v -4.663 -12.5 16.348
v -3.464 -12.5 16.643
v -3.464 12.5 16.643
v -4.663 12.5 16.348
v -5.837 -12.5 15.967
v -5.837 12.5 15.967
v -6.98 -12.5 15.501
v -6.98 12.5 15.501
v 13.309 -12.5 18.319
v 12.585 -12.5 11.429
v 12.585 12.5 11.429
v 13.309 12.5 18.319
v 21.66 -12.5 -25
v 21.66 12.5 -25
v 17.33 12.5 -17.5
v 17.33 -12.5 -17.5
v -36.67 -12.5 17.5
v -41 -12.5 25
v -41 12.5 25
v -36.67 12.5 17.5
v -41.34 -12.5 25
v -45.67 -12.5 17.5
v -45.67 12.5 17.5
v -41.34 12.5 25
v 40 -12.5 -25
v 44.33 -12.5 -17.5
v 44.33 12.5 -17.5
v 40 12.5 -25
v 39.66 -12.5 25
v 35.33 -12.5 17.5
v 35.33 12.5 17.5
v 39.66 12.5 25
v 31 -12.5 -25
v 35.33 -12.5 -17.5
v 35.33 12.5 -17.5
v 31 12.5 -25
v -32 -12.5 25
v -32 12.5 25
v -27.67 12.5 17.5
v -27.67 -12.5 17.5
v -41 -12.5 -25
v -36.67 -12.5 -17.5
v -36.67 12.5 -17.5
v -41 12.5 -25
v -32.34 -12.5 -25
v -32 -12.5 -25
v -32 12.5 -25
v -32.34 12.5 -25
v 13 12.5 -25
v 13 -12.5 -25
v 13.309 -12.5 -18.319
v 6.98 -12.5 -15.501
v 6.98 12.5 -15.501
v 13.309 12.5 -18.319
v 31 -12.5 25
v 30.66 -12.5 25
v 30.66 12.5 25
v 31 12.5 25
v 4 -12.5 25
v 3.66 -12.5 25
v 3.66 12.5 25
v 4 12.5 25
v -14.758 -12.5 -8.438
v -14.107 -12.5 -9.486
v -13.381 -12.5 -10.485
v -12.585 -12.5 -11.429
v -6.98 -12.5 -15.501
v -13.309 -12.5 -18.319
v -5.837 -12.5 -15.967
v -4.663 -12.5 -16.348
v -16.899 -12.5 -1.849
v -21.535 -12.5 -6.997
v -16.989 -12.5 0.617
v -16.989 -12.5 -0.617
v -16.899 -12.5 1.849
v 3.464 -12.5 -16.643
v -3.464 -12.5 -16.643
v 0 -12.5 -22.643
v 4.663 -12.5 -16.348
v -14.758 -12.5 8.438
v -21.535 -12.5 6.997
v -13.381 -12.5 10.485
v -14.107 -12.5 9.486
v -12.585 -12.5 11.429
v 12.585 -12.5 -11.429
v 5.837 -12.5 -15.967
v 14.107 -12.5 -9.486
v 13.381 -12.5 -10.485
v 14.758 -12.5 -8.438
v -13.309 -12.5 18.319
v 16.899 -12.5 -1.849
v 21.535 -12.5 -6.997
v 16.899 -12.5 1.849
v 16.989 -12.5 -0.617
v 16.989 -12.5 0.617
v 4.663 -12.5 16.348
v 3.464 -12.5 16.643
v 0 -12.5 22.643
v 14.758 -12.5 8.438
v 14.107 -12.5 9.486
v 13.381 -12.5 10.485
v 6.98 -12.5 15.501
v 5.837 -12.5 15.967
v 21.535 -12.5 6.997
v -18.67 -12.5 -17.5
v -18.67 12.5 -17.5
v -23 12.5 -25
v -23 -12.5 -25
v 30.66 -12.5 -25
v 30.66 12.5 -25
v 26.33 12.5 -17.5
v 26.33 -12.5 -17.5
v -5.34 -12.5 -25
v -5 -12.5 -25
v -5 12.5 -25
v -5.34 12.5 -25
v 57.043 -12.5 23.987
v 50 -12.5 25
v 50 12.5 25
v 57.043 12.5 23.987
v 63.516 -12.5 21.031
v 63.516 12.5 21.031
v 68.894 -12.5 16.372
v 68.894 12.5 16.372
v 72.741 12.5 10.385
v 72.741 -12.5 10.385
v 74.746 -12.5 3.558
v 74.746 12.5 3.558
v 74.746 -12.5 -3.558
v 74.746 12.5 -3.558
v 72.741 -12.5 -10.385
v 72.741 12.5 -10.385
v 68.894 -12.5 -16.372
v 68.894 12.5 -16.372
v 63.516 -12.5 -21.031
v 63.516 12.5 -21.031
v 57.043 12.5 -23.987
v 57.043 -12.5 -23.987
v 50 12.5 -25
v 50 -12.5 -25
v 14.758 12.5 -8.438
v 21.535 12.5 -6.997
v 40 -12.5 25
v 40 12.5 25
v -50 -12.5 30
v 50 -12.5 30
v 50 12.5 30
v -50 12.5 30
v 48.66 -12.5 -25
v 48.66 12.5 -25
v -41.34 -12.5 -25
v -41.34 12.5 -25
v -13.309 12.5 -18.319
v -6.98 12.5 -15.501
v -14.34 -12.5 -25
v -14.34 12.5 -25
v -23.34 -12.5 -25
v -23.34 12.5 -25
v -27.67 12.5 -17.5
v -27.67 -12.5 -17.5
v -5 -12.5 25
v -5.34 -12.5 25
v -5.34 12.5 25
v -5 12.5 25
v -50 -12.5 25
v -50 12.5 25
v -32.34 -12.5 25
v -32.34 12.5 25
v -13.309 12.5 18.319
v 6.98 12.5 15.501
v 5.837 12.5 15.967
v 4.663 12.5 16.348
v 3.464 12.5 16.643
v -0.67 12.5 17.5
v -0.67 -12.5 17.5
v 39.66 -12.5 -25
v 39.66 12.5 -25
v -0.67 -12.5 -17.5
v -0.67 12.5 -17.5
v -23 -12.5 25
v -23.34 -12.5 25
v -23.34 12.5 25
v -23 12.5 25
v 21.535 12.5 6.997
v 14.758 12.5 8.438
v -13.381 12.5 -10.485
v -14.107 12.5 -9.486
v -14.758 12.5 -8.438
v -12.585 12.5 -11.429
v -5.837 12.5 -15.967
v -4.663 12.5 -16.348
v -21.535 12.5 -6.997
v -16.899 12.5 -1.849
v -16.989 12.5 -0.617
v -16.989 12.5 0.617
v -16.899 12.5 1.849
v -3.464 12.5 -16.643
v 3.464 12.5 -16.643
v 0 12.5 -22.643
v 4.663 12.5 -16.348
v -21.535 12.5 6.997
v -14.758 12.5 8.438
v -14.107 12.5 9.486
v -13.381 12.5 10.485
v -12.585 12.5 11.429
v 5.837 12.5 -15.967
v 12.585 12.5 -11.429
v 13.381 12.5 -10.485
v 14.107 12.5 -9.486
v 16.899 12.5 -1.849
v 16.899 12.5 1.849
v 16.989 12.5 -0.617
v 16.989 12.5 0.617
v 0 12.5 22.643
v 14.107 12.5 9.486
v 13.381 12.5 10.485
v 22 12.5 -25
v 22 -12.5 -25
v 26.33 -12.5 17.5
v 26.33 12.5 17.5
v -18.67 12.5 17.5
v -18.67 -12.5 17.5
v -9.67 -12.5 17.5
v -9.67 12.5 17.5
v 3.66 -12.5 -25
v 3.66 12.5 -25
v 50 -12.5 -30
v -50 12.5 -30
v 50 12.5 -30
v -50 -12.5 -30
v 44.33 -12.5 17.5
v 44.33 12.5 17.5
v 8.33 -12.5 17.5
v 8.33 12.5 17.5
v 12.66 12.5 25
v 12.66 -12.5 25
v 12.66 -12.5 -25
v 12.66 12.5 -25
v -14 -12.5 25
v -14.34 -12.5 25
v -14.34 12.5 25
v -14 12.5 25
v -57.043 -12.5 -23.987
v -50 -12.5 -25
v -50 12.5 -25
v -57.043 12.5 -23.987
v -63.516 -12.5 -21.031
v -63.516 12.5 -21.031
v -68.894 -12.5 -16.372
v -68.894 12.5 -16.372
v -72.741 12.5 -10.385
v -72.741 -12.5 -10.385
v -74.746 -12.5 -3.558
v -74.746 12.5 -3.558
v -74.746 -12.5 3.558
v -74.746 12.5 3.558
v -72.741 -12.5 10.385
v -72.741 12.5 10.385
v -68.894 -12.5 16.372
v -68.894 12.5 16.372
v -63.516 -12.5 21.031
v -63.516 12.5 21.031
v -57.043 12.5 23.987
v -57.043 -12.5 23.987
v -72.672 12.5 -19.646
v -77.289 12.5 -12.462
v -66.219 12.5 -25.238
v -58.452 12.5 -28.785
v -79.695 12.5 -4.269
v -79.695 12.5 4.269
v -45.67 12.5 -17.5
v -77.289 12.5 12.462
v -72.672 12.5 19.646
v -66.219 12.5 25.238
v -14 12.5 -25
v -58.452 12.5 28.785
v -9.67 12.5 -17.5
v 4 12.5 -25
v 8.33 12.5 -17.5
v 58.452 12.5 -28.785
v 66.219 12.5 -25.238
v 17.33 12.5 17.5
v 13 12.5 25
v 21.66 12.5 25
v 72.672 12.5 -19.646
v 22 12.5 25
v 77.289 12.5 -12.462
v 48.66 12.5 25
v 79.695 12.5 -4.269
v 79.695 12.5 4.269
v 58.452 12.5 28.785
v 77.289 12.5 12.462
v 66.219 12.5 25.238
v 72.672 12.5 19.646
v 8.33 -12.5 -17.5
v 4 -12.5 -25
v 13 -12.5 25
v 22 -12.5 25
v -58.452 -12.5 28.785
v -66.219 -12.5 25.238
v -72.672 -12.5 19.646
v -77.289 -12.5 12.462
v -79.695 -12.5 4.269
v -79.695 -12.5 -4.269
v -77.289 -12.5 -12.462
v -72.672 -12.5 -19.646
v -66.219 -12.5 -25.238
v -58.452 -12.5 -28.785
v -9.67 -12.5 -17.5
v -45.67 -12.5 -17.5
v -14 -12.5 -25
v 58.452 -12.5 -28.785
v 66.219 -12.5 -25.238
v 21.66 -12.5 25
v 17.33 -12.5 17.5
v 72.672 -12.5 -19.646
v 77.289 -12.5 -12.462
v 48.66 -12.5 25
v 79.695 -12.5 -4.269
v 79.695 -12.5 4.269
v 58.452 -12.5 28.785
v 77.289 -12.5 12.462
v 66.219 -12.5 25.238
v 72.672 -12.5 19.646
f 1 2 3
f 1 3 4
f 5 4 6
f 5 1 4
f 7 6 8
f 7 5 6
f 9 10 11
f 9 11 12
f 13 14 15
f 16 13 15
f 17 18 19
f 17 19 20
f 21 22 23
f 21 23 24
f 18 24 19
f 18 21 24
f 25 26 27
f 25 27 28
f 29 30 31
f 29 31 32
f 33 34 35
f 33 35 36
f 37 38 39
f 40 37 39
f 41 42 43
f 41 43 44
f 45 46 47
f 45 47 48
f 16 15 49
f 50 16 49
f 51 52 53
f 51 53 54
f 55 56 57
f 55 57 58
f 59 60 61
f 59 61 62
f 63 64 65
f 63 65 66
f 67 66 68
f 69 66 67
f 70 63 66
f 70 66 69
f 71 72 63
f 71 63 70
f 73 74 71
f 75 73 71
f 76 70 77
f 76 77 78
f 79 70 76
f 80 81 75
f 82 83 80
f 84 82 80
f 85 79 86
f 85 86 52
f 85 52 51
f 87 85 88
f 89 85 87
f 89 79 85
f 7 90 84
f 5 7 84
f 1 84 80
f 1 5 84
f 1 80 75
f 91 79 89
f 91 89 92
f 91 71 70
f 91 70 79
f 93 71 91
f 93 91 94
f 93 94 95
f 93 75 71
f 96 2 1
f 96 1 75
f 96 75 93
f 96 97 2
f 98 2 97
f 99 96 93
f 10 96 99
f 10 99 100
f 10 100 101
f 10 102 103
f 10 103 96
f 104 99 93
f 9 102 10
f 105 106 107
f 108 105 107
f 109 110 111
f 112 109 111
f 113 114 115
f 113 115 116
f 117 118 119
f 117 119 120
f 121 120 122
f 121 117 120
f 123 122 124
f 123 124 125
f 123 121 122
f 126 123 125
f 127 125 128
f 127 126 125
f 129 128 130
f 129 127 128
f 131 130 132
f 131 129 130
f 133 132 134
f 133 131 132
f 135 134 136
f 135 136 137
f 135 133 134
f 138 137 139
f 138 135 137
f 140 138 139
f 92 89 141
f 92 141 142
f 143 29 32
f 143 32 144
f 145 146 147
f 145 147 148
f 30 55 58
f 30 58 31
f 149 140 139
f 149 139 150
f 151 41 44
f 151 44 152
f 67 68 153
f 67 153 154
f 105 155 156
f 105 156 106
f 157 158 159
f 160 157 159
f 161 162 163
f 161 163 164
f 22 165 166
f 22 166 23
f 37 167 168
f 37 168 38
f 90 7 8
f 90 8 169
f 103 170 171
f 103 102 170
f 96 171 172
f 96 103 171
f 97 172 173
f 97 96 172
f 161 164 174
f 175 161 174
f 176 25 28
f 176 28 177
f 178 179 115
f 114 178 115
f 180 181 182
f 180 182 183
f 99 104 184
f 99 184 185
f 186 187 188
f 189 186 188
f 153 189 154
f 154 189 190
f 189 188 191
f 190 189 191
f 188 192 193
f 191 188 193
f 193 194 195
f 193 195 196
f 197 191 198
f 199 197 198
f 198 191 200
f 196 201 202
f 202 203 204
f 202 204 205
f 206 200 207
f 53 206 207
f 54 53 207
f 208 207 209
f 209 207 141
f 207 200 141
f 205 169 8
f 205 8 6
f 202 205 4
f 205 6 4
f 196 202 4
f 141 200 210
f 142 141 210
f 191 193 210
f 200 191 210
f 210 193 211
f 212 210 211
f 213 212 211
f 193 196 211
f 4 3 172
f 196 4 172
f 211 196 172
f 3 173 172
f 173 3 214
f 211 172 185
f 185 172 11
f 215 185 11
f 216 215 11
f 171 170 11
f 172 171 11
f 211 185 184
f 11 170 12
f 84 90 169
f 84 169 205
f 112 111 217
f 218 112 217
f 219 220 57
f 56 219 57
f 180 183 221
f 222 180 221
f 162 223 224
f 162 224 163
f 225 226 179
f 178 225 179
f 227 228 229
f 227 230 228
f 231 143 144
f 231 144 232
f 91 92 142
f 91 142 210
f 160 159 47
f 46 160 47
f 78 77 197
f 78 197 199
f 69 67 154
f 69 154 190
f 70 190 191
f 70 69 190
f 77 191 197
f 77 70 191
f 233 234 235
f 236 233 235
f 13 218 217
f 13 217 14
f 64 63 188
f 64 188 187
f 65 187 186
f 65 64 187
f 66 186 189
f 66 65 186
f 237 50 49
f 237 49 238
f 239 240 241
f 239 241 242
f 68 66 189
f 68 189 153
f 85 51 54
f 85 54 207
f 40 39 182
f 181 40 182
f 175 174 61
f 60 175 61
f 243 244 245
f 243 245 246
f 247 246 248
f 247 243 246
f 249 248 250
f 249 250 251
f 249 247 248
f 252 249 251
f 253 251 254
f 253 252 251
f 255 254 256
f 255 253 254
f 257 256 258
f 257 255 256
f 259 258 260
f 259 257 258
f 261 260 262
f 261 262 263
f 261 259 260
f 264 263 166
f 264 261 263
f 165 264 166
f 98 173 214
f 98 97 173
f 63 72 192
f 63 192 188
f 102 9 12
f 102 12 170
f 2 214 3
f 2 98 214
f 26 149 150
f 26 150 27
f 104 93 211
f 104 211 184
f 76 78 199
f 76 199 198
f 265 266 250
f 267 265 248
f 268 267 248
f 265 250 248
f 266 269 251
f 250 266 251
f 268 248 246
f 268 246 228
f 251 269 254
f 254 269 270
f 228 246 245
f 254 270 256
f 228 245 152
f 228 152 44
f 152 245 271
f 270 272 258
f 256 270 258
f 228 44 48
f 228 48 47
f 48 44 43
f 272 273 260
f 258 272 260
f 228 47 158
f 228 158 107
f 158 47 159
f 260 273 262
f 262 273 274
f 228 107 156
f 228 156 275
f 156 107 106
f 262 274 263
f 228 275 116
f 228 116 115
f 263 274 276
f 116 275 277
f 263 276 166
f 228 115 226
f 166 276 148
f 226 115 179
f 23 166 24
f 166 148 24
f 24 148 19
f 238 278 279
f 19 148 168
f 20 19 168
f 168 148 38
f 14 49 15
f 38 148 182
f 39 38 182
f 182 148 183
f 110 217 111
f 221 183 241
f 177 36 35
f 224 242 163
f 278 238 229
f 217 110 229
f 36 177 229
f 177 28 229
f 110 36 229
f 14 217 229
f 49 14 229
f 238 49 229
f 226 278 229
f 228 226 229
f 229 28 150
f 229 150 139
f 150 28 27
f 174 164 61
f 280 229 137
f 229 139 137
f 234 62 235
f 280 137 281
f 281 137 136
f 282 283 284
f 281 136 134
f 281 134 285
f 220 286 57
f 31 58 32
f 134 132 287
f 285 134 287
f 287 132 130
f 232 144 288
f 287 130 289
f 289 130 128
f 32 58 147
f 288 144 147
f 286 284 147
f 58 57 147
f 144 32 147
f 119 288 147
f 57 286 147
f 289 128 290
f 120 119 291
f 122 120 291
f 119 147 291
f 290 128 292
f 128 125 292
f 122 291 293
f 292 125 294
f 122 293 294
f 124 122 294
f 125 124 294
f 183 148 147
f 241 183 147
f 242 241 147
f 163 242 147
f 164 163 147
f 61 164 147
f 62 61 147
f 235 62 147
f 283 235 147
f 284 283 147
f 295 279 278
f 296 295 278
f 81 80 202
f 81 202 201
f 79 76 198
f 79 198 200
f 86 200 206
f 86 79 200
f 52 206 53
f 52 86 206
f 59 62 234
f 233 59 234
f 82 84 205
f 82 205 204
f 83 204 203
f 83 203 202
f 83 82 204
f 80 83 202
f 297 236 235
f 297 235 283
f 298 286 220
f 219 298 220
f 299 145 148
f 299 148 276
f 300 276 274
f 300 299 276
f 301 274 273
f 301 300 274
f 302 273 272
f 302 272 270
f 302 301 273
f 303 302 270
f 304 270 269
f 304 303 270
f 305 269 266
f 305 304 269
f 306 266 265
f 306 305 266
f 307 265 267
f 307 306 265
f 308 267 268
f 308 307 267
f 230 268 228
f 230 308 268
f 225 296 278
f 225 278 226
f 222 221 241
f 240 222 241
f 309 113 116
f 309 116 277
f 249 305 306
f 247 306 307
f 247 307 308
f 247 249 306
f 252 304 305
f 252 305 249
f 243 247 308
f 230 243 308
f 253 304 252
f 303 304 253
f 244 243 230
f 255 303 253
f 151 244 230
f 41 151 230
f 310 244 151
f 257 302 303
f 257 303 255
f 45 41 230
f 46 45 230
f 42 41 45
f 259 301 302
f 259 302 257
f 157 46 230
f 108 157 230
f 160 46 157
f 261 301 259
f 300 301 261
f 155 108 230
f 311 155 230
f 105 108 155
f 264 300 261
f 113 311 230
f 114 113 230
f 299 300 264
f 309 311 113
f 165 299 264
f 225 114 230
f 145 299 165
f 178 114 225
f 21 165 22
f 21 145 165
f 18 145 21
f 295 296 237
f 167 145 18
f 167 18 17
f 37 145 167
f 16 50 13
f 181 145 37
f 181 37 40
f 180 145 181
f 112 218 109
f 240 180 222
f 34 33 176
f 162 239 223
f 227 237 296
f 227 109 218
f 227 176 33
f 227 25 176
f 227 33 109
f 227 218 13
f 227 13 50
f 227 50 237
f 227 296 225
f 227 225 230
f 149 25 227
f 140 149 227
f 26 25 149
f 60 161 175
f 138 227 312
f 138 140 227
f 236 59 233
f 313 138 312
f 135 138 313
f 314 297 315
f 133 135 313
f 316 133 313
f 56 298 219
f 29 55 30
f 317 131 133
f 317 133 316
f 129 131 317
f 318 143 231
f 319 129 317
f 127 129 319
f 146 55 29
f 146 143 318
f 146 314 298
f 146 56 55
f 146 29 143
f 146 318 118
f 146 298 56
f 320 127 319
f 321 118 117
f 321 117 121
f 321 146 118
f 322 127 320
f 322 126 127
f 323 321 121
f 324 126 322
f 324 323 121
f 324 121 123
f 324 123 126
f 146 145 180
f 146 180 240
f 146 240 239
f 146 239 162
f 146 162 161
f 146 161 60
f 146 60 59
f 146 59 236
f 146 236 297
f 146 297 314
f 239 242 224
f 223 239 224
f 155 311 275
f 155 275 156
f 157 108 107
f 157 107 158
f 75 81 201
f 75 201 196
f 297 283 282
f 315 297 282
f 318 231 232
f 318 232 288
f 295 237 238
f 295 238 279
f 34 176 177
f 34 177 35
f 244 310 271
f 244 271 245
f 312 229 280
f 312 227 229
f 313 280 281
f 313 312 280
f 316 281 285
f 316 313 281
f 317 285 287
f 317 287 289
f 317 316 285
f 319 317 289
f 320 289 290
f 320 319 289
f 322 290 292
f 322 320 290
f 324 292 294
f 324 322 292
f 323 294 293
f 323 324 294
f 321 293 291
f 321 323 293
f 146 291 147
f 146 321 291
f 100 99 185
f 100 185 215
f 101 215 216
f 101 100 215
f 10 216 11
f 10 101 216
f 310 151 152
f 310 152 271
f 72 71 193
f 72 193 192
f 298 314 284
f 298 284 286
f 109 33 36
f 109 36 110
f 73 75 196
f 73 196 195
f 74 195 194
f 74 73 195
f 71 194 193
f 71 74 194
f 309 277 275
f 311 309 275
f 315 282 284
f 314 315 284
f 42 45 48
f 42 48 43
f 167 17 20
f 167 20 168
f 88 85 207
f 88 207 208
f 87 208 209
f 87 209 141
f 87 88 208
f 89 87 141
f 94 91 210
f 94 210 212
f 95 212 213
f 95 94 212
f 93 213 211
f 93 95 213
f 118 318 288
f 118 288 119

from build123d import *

# Parameters (mm, degrees)
F1_DEPTH = 12.5
F3_DEPTH = 12.5


with BuildPart() as f1:
    # F0 (on Front) → F1 (new body, symmetric)
    with BuildSketch(Plane.XZ):
        with BuildLine():
            ThreePointArc((50, -30), (80, 0), (50, 30))
            Line((50, 30), (-50, 30))
            ThreePointArc((-50, 30), (-80, 0), (-50, -30))
            Line((-50, -30), (50, -30))
        make_face()
        with BuildLine():
            Line((48.6602540378, 25), (50, 25))
            ThreePointArc((50, 25), (75, 0), (50, -25))
            Line((50, -25), (48.6602540378, -25))
            Line((48.6602540378, -25), (40, -25))
            Line((40, -25), (39.6602540378, -25))
            Line((39.6602540378, -25), (31, -25))
            Line((31, -25), (30.6602540378, -25))
            Line((30.6602540378, -25), (22, -25))
            Line((22, -25), (21.6602540378, -25))
            Line((21.6602540378, -25), (13, -25))
            Line((13, -25), (12.6602540378, -25))
            Line((12.6602540378, -25), (4, -25))
            Line((4, -25), (3.6602540378, -25))
            Line((3.6602540378, -25), (-5, -25))
            Line((-5, -25), (-5.3397459622, -25))
            Line((-5.3397459622, -25), (-14, -25))
            Line((-14, -25), (-14.3397459622, -25))
            Line((-14.3397459622, -25), (-23, -25))
            Line((-23, -25), (-23.3397459622, -25))
            Line((-23.3397459622, -25), (-32, -25))
            Line((-32, -25), (-32.3397459622, -25))
            Line((-32.3397459622, -25), (-41, -25))
            Line((-41, -25), (-41.3397459622, -25))
            Line((-41.3397459622, -25), (-50, -25))
            ThreePointArc((-50, -25), (-75, 0), (-50, 25))
            Line((-50, 25), (-41.3397459622, 25))
            Line((-41.3397459622, 25), (-41, 25))
            Line((-41, 25), (-32.3397459622, 25))
            Line((-32.3397459622, 25), (-32, 25))
            Line((-32, 25), (-23.3397459622, 25))
            Line((-23.3397459622, 25), (-23, 25))
            Line((-23, 25), (-14.3397459622, 25))
            Line((-14.3397459622, 25), (-14, 25))
            Line((-14, 25), (-5.3397459622, 25))
            Line((-5.3397459622, 25), (-5, 25))
            Line((-5, 25), (3.6602540378, 25))
            Line((3.6602540378, 25), (4, 25))
            Line((4, 25), (12.6602540378, 25))
            Line((12.6602540378, 25), (13, 25))
            Line((13, 25), (21.6602540378, 25))
            Line((21.6602540378, 25), (22, 25))
            Line((22, 25), (30.6602540378, 25))
            Line((30.6602540378, 25), (31, 25))
            Line((31, 25), (39.6602540378, 25))
            Line((39.6602540378, 25), (40, 25))
            Line((40, 25), (48.6602540378, 25))
        make_face(mode=Mode.SUBTRACT)
        Polygon((44.3301270189, 17.5), (48.6602540378, 25), (40, 25), align=None)
        Polygon((40, -25), (48.6602540378, -25), (44.3301270189, -17.5), align=None)
        Polygon((35.3301270189, 17.5), (39.6602540378, 25), (31, 25), align=None)
        Polygon((31, -25), (39.6602540378, -25), (35.3301270189, -17.5), align=None)
        Polygon((26.3301270189, 17.5), (30.6602540378, 25), (22, 25), align=None)
        Polygon((22, -25), (30.6602540378, -25), (26.3301270189, -17.5), align=None)
        Polygon((17.3301270189, 17.5), (21.6602540378, 25), (13, 25), align=None)
        Polygon((13, -25), (21.6602540378, -25), (17.3301270189, -17.5), align=None)
        Polygon((8.3301270189, 17.5), (12.6602540378, 25), (4, 25), align=None)
        Polygon((4, -25), (12.6602540378, -25), (8.3301270189, -17.5), align=None)
        Polygon((-0.6698729811, 17.5), (3.6602540378, 25), (-5, 25), align=None)
        Polygon((-5, -25), (3.6602540378, -25), (-0.6698729811, -17.5), align=None)
        Polygon((-9.6698729811, 17.5), (-5.3397459622, 25), (-14, 25), align=None)
        Polygon((-14, -25), (-5.3397459622, -25), (-9.6698729811, -17.5), align=None)
        Polygon((-18.6698729811, 17.5), (-14.3397459622, 25), (-23, 25), align=None)
        Polygon((-23, -25), (-14.3397459622, -25), (-18.6698729811, -17.5), align=None)
        Polygon((-27.6698729811, 17.5), (-23.3397459622, 25), (-32, 25), align=None)
        Polygon((-32, -25), (-23.3397459622, -25), (-27.6698729811, -17.5), align=None)
        Polygon((-36.6698729811, 17.5), (-32.3397459622, 25), (-41, 25), align=None)
        Polygon((-41, -25), (-32.3397459622, -25), (-36.6698729811, -17.5), align=None)
        Polygon((-45.6698729811, 17.5), (-41.3397459622, 25), (-50, 25), align=None)
        Polygon((-50, -25), (-41.3397459622, -25), (-45.6698729811, -17.5), align=None)
    extrude(amount=F1_DEPTH, both=True)


with BuildPart() as f3:
    # F2 (on Front) → F3 (new body, symmetric)
    with BuildSketch(Plane.XZ):
        with BuildLine():
            Line((0, 22.6433169771), (-3.4641016151, 16.6433169771))
            ThreePointArc((-3.4641016151, 16.6433169771), (-5.2532889044, 16.167960777), (-6.9801791915, 15.5008741191))
            ThreePointArc((-6.9801791915, 15.5008741191), (-9.992349289, 13.7532889044), (-12.5852133453, 11.4285784354))
            ThreePointArc((-12.5852133453, 11.4285784354), (-13.7532889044, 9.992349289), (-14.7582687945, 8.4376242029))
            Line((-14.7582687945, 8.4376242029), (-21.5350741616, 6.9971697549))
            Line((-21.5350741616, 6.9971697549), (-16.8992013331, 1.8485113745))
            ThreePointArc((-16.8992013331, 1.8485113745), (-17, 0), (-16.8992013331, -1.8485113745))
            Line((-16.8992013331, -1.8485113745), (-21.5350741616, -6.9971697549))
            Line((-21.5350741616, -6.9971697549), (-14.7582687945, -8.4376242029))
            ThreePointArc((-14.7582687945, -8.4376242029), (-13.7532889044, -9.992349289), (-12.5852133453, -11.4285784354))
            Line((-12.5852133453, -11.4285784354), (-13.3094077821, -18.3188282435))
            Line((-13.3094077821, -18.3188282435), (-6.9801791915, -15.5008741191))
            ThreePointArc((-6.9801791915, -15.5008741191), (-5.2532889044, -16.167960777), (-3.4641016151, -16.6433169771))
            Line((-3.4641016151, -16.6433169771), (0, -22.6433169771))
            Line((0, -22.6433169771), (3.4641016151, -16.6433169771))
            ThreePointArc((3.4641016151, -16.6433169771), (5.2532889044, -16.167960777), (6.9801791915, -15.5008741191))
            Line((6.9801791915, -15.5008741191), (13.3094077821, -18.3188282435))
            Line((13.3094077821, -18.3188282435), (12.5852133453, -11.4285784354))
            ThreePointArc((12.5852133453, -11.4285784354), (13.7532889044, -9.992349289), (14.7582687945, -8.4376242029))
            Line((14.7582687945, -8.4376242029), (21.5350741616, -6.9971697549))
            Line((21.5350741616, -6.9971697549), (16.8992013331, -1.8485113745))
            ThreePointArc((16.8992013331, -1.8485113745), (17, 0), (16.8992013331, 1.8485113745))
            Line((16.8992013331, 1.8485113745), (21.5350741616, 6.9971697549))
            Line((21.5350741616, 6.9971697549), (14.7582687945, 8.4376242029))
            ThreePointArc((14.7582687945, 8.4376242029), (13.7532889044, 9.992349289), (12.5852133453, 11.4285784354))
            Line((12.5852133453, 11.4285784354), (13.3094077821, 18.3188282435))
            Line((13.3094077821, 18.3188282435), (6.9801791915, 15.5008741191))
            ThreePointArc((6.9801791915, 15.5008741191), (5.2532889044, 16.167960777), (3.4641016151, 16.6433169771))
            Line((3.4641016151, 16.6433169771), (0, 22.6433169771))
        make_face()
        with BuildLine():
            ThreePointArc((-12.5852133453, 11.4285784354), (-9.992349289, 13.7532889044), (-6.9801791915, 15.5008741191))
            Line((-6.9801791915, 15.5008741191), (-13.3094077821, 18.3188282435))
            Line((-13.3094077821, 18.3188282435), (-12.5852133453, 11.4285784354))
        make_face()
    extrude(amount=F3_DEPTH, both=True)


solid = Compound([f1.part, f3.part])
